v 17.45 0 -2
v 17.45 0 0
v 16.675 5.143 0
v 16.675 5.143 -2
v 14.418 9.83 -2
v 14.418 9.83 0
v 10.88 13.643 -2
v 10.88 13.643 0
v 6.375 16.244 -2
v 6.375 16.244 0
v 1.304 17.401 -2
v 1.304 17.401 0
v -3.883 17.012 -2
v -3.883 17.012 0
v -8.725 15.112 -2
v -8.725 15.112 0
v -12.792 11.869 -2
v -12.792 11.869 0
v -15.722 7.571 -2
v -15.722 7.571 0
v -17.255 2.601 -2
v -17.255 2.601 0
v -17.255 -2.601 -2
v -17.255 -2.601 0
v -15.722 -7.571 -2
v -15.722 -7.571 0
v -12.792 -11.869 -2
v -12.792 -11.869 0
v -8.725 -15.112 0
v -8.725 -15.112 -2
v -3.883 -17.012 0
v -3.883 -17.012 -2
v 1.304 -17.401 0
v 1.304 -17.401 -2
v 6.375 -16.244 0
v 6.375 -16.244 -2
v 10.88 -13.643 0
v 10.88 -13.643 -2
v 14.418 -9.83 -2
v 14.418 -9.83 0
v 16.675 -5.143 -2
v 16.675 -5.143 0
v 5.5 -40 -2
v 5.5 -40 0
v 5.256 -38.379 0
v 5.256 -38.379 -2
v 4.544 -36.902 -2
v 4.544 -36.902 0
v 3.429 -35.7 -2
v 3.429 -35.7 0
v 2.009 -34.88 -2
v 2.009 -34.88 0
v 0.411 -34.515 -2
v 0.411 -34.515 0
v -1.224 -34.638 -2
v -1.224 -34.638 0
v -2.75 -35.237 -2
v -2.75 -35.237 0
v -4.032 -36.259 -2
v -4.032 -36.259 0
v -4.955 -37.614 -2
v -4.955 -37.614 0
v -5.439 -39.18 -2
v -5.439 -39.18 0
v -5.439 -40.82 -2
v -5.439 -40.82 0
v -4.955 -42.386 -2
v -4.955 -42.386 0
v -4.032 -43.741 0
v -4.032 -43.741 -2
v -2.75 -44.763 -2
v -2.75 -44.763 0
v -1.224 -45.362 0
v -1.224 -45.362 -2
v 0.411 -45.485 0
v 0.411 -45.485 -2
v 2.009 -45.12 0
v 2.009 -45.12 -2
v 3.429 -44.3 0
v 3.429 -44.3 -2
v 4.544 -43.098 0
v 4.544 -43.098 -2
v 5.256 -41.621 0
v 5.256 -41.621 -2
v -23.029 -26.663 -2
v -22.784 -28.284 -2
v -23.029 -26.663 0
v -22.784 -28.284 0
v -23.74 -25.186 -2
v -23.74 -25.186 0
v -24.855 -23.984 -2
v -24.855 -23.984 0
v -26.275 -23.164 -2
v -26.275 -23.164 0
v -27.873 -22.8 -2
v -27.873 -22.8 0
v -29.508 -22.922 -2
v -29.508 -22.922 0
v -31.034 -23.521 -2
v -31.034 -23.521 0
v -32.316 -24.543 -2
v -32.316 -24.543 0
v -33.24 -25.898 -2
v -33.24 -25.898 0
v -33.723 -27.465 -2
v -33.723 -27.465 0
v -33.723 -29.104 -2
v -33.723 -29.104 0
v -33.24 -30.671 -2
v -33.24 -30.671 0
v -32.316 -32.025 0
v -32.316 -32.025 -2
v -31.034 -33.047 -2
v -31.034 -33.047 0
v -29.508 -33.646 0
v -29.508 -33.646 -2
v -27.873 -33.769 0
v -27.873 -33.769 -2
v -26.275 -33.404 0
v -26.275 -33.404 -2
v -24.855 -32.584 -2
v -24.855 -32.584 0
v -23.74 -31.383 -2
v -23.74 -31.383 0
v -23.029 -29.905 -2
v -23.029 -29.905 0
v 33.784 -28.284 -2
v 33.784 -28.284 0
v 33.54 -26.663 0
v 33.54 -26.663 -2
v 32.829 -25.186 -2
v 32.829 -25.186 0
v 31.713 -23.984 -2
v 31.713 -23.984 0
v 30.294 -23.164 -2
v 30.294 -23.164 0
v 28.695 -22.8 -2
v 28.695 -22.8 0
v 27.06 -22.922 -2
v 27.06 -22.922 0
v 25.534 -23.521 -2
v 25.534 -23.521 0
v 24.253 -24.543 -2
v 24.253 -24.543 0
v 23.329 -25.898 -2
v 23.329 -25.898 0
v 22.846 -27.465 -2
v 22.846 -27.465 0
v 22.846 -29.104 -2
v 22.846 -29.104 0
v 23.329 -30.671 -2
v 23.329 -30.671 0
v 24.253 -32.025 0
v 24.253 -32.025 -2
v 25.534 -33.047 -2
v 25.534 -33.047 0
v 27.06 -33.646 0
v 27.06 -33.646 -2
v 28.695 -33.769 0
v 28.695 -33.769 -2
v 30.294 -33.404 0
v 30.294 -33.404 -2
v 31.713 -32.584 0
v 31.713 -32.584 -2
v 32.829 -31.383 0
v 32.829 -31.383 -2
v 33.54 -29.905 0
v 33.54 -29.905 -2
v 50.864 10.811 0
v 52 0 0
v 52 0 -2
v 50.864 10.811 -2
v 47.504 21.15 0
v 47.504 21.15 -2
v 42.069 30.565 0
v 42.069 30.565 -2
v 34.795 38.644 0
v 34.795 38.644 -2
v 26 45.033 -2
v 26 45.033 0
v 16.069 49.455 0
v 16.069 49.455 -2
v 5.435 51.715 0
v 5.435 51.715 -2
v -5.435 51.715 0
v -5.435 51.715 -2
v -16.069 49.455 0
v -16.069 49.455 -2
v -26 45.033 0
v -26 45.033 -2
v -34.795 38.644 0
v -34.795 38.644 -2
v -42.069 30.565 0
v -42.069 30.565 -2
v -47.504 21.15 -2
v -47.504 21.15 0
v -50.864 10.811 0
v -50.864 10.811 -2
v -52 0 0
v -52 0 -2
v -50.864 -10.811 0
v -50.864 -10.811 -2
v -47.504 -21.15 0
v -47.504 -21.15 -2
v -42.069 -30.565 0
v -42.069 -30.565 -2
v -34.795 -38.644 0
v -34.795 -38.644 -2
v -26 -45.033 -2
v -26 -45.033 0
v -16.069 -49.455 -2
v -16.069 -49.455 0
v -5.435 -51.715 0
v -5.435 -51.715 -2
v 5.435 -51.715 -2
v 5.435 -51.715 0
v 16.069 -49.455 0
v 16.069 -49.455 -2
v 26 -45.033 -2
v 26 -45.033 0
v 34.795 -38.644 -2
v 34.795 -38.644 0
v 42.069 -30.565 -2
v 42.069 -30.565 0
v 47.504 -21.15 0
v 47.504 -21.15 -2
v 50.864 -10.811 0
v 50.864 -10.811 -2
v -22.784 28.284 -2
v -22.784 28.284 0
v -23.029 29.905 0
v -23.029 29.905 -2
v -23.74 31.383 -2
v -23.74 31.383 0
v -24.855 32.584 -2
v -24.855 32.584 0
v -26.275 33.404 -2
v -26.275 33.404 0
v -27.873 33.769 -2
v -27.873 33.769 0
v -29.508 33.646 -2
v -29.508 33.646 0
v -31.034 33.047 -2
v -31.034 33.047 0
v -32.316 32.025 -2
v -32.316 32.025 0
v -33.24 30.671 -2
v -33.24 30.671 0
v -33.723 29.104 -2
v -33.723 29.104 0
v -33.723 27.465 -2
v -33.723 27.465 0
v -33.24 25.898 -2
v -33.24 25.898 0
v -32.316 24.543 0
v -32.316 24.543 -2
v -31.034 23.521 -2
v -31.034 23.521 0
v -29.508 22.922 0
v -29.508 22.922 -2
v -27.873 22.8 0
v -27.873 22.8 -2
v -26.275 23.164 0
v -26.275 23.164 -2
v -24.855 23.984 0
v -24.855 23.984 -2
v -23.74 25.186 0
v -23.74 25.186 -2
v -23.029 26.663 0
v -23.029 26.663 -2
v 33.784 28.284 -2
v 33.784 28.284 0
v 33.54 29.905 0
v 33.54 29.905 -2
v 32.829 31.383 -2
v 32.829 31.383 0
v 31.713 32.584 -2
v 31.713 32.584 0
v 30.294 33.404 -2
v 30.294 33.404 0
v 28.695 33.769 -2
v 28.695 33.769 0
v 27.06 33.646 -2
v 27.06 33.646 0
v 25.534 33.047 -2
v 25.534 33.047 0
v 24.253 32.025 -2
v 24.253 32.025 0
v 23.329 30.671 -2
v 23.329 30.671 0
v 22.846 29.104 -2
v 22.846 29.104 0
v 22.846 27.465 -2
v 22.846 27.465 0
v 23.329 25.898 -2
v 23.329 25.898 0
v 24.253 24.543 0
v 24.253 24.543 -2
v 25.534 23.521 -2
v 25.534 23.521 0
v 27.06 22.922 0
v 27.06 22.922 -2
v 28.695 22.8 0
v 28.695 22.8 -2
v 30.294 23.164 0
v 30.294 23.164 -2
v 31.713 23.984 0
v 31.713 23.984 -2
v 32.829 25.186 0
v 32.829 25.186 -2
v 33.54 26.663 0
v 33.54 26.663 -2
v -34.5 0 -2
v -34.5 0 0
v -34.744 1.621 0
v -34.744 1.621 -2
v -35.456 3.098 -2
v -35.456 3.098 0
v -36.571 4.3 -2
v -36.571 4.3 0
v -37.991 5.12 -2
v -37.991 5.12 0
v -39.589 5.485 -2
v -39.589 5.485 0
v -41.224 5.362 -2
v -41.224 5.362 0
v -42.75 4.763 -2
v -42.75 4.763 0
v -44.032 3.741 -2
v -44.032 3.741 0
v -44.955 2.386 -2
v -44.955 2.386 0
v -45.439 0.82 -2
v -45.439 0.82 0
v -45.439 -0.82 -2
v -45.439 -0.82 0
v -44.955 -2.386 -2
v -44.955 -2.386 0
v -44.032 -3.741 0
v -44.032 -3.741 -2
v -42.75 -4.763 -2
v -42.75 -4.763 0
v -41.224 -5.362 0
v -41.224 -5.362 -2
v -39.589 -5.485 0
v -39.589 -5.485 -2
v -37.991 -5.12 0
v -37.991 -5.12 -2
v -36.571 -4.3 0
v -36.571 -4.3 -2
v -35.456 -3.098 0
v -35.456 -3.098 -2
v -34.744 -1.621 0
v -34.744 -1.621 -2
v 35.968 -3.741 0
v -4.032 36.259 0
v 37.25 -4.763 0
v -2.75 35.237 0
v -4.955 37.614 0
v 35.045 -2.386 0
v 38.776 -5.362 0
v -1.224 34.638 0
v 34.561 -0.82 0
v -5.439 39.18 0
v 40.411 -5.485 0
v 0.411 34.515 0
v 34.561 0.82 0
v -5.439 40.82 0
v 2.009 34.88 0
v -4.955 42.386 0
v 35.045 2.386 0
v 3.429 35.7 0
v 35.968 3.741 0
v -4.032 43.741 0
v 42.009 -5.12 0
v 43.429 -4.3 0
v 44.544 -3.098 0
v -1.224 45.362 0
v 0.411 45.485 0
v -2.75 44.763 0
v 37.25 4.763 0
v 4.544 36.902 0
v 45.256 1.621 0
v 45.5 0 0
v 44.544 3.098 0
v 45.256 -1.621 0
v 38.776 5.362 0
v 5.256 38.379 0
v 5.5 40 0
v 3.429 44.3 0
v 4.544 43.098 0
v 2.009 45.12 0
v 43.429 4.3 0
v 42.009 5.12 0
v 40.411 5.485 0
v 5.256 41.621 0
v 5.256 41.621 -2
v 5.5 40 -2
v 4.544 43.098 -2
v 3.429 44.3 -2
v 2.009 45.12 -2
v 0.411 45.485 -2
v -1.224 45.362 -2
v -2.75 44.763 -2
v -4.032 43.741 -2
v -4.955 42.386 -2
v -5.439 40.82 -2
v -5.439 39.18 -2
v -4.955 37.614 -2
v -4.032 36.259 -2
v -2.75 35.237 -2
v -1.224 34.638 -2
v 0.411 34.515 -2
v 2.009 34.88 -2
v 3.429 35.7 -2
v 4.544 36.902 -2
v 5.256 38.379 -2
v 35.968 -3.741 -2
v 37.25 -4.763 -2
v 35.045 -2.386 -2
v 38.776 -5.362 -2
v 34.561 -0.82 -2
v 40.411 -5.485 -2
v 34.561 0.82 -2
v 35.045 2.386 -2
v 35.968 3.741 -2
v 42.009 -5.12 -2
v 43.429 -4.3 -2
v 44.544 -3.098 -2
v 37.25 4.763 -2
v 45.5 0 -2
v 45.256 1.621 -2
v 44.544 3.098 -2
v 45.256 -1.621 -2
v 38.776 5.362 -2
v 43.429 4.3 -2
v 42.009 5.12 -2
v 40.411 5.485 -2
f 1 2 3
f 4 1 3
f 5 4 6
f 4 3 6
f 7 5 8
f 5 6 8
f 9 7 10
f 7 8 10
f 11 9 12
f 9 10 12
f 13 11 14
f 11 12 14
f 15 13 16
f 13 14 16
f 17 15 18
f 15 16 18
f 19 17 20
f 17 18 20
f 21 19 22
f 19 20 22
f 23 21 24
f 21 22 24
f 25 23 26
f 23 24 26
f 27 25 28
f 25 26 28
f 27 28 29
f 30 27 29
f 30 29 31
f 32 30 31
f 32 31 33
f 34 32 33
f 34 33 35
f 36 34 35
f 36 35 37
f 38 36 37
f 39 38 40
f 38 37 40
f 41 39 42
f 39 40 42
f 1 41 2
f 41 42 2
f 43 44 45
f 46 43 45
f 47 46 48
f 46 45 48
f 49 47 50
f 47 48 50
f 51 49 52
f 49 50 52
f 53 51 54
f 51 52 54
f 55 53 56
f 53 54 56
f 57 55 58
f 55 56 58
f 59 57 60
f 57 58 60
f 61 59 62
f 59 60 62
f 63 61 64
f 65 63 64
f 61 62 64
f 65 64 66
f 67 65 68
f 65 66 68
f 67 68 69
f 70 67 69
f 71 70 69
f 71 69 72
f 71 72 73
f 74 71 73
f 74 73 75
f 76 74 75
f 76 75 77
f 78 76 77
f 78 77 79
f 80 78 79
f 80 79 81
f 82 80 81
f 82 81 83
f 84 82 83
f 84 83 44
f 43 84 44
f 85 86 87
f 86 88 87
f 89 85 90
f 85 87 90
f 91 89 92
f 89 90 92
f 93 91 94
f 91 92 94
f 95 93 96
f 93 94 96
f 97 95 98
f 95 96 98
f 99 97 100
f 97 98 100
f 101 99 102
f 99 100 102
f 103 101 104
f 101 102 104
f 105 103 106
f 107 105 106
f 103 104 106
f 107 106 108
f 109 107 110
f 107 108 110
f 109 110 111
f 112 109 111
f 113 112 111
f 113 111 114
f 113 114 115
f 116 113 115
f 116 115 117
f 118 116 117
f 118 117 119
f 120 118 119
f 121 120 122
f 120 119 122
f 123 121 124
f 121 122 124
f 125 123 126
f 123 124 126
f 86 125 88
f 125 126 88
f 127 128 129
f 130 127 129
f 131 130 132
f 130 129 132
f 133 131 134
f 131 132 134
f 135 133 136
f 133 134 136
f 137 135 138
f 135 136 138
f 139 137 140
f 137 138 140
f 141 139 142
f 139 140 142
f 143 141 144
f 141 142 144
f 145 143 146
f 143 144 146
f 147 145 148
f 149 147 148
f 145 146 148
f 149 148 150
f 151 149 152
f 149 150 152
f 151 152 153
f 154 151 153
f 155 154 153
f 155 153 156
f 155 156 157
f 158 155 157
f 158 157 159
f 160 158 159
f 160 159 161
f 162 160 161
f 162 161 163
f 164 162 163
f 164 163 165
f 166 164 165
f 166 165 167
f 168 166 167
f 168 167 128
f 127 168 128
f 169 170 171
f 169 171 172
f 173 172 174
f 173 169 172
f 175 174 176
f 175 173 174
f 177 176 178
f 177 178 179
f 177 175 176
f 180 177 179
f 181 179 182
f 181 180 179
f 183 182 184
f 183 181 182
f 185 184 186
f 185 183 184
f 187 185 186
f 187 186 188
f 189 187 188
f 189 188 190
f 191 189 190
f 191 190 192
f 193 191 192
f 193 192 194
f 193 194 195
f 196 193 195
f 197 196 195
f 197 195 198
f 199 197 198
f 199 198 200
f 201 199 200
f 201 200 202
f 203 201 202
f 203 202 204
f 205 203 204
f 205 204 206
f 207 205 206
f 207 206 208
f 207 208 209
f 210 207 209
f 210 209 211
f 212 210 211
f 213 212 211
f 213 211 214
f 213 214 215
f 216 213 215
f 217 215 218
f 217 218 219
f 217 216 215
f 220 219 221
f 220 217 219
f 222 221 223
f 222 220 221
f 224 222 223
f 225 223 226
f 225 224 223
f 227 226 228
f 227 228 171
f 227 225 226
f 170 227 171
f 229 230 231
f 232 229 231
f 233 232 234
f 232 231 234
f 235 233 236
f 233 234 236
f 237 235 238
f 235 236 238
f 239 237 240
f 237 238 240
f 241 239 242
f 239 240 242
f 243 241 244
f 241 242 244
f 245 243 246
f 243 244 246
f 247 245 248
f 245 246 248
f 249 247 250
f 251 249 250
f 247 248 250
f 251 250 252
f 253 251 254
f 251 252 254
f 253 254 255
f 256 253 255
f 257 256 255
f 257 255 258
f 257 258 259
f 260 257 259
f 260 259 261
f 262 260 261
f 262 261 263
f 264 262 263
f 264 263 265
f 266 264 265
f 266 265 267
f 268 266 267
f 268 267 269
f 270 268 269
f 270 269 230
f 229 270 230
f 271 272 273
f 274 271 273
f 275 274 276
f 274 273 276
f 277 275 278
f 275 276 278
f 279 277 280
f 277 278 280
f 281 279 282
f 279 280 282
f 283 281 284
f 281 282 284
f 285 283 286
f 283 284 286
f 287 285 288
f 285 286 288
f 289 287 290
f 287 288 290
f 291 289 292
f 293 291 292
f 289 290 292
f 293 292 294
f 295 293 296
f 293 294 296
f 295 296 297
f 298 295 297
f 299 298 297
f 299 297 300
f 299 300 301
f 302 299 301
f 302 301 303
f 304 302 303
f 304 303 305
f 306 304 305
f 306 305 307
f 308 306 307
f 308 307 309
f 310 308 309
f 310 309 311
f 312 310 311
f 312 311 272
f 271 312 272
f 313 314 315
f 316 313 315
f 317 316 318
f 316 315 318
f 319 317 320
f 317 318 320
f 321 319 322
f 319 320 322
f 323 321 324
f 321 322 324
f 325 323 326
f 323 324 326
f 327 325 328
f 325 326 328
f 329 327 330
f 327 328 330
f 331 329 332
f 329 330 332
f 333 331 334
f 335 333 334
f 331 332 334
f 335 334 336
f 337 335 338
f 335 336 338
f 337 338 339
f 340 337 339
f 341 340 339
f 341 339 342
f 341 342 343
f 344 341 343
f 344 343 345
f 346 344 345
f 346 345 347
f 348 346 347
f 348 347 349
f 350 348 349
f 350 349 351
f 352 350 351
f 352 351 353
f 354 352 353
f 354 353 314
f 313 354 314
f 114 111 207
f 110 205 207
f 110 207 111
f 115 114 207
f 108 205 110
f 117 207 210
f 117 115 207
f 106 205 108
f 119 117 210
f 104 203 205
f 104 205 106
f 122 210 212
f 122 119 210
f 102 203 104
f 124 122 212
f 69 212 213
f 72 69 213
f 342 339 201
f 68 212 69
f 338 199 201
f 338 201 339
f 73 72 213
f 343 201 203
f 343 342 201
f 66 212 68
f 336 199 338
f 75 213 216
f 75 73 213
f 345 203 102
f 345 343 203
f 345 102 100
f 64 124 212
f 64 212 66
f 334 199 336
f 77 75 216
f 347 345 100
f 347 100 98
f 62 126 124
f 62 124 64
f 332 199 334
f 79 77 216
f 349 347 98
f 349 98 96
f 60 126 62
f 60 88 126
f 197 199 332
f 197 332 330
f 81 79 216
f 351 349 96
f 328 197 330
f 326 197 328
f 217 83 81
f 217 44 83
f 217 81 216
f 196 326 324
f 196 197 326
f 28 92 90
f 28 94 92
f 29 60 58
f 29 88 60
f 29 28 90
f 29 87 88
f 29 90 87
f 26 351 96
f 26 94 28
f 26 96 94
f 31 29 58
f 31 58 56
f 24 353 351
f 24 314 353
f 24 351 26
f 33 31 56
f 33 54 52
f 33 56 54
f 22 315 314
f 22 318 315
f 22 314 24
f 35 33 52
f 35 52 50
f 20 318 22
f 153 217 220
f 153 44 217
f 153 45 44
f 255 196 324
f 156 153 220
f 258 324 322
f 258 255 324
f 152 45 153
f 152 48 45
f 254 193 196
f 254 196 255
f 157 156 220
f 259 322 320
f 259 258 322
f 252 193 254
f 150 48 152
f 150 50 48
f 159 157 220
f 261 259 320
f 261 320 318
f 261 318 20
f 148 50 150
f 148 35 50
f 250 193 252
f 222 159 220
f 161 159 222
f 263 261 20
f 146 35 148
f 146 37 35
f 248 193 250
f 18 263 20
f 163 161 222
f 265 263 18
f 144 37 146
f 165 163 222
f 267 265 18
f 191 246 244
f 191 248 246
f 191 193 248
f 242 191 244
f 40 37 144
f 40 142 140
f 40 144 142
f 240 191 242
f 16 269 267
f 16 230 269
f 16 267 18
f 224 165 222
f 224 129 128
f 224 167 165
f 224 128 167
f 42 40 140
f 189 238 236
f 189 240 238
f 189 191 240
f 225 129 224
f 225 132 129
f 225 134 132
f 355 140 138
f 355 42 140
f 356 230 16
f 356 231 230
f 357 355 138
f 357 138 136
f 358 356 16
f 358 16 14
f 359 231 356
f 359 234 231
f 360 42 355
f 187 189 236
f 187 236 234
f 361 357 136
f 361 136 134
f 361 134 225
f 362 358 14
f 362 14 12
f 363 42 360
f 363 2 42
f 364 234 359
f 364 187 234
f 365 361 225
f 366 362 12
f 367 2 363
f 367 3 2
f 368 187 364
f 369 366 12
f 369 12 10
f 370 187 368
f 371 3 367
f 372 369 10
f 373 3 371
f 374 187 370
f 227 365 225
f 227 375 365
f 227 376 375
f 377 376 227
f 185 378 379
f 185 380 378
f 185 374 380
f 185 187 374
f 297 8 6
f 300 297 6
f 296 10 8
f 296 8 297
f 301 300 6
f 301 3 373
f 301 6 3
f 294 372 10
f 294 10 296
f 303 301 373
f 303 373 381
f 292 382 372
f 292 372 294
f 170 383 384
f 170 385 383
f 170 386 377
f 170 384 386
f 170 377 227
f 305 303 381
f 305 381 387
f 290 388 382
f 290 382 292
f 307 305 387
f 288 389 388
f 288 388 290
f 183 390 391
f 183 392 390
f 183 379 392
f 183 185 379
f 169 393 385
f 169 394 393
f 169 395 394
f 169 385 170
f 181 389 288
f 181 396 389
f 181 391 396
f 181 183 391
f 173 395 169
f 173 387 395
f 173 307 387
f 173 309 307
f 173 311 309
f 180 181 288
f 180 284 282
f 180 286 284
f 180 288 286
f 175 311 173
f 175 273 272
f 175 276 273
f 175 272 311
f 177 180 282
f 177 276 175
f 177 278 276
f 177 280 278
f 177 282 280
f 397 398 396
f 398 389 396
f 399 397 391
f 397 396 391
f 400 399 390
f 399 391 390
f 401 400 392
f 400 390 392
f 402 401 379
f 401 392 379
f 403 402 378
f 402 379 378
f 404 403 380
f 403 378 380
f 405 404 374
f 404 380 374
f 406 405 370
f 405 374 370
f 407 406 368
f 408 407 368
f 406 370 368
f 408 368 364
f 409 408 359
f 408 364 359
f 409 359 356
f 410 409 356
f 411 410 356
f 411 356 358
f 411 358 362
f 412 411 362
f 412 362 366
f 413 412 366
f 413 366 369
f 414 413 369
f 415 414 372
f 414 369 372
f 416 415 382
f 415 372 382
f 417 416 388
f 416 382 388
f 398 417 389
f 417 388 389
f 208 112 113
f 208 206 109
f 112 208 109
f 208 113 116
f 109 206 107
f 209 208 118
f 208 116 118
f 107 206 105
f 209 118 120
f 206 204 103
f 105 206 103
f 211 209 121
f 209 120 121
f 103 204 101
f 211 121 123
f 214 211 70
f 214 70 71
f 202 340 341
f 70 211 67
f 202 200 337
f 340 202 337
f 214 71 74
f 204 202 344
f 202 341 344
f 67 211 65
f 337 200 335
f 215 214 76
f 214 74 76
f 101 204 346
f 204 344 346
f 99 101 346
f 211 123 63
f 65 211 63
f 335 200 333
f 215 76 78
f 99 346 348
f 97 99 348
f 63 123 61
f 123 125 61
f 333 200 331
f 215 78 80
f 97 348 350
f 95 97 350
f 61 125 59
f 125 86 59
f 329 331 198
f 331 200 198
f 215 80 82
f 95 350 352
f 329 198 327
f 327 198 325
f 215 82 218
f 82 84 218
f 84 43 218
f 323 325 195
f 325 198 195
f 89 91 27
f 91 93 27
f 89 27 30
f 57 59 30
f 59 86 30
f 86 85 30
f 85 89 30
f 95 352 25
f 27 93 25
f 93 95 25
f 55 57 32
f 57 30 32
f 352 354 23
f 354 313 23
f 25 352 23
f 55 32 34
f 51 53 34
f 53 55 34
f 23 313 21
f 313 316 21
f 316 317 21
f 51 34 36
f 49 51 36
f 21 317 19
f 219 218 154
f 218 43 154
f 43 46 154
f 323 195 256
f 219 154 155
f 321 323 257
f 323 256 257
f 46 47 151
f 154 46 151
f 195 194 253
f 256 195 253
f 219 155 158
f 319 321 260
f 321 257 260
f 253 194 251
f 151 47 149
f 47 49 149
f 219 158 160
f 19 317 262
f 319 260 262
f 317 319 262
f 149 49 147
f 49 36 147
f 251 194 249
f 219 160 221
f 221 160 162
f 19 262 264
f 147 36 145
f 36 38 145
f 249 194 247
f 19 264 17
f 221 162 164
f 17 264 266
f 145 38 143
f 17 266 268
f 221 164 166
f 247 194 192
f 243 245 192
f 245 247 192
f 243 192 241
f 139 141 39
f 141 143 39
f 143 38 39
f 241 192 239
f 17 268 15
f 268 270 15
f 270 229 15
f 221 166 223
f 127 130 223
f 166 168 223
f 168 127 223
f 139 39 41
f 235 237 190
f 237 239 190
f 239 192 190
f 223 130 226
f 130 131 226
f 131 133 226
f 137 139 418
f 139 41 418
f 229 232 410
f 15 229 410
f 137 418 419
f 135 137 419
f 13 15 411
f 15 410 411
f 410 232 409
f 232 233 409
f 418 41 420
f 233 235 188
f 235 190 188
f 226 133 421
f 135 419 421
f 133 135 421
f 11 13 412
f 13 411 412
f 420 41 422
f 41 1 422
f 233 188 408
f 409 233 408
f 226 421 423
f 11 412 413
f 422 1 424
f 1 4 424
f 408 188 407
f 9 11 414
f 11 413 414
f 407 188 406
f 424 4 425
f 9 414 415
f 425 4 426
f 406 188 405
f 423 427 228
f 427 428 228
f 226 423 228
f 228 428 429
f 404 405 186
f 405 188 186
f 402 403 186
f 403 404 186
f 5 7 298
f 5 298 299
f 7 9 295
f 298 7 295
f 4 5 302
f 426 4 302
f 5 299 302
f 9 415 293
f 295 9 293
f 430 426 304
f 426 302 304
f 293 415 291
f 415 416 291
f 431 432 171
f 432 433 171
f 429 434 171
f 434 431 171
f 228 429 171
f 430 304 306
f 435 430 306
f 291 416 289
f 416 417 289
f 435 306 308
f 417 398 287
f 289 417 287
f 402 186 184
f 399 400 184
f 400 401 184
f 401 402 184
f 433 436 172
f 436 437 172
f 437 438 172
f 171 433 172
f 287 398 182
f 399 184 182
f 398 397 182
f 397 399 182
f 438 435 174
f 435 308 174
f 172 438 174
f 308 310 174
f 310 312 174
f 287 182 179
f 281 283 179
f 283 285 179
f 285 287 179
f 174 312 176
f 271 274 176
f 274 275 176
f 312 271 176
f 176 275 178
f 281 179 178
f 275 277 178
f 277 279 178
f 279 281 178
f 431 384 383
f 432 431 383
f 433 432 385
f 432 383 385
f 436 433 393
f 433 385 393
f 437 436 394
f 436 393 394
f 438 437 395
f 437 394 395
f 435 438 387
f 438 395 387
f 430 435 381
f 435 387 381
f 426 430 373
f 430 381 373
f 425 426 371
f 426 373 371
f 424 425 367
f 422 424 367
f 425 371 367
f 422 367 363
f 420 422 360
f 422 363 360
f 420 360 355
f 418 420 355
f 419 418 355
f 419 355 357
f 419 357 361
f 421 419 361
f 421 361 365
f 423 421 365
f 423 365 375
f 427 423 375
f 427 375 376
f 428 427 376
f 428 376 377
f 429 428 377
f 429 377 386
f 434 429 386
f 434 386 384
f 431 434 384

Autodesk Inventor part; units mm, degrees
ref_plane "YZ Plane" through (0, 0, 0) normal (1, 0, 0) x (0, 1, 0)
ref_plane "XZ Plane" through (0, 0, 0) normal (0, 1, 0) x (-1, 0, 0)
ref_plane "XY Plane" through (0, 0, 0) normal (0, 0, 1) x (1, 0, 0)
sketch "Sketch1" plane through (0, 0, 0) normal (0, 0, 1) x (1, 0, 0)
  circle A0 centre (0, 0) radius 52
  circle A1 centre (0, 0) radius 17.45
  circle A2 centre (0, 0) radius 40 construction
  circle A3 centre (40, 0) radius 5.5
  circle A4 centre (28.2843, 28.2843) radius 5.5
  circle A5 centre (0, 40) radius 5.5
  circle A6 centre (-28.2843, 28.2843) radius 5.5
  circle A7 centre (-40, 0) radius 5.5
  circle A8 centre (-28.2843, -28.2843) radius 5.5
  circle A9 centre (0, -40) radius 5.5
  circle A10 centre (28.2843, -28.2843) radius 5.5
  dimension "d39" = 80
  dimension "d31" = 34.9
  dimension "d32" = 104
  dimension "d40" = 11
  dimension "d43" = 360
extrude "Plate1" add sketch "Sketch1" against normal blind 2
equation "\"d15\" = Thickness"
equation "\"BendRadius\" = Thickness"
equation "\"BendReliefWidth\" = Thickness"
equation "\"BendReliefDepth\" = 0.5 * Thickness"
equation "\"CornerReliefSize\" = 4 * Thickness"
equation "\"MinimumRemnant\" = 2 * Thickness"
equation "\"TransitionRadius\" = BendRadius"
equation "\"JacobiRadiusSize\" = BendRadius"
equation "\"GapSize\" = Thickness"
equation "\"Thickness\" = 2"
properties part number "DMF flange small gear 2"
